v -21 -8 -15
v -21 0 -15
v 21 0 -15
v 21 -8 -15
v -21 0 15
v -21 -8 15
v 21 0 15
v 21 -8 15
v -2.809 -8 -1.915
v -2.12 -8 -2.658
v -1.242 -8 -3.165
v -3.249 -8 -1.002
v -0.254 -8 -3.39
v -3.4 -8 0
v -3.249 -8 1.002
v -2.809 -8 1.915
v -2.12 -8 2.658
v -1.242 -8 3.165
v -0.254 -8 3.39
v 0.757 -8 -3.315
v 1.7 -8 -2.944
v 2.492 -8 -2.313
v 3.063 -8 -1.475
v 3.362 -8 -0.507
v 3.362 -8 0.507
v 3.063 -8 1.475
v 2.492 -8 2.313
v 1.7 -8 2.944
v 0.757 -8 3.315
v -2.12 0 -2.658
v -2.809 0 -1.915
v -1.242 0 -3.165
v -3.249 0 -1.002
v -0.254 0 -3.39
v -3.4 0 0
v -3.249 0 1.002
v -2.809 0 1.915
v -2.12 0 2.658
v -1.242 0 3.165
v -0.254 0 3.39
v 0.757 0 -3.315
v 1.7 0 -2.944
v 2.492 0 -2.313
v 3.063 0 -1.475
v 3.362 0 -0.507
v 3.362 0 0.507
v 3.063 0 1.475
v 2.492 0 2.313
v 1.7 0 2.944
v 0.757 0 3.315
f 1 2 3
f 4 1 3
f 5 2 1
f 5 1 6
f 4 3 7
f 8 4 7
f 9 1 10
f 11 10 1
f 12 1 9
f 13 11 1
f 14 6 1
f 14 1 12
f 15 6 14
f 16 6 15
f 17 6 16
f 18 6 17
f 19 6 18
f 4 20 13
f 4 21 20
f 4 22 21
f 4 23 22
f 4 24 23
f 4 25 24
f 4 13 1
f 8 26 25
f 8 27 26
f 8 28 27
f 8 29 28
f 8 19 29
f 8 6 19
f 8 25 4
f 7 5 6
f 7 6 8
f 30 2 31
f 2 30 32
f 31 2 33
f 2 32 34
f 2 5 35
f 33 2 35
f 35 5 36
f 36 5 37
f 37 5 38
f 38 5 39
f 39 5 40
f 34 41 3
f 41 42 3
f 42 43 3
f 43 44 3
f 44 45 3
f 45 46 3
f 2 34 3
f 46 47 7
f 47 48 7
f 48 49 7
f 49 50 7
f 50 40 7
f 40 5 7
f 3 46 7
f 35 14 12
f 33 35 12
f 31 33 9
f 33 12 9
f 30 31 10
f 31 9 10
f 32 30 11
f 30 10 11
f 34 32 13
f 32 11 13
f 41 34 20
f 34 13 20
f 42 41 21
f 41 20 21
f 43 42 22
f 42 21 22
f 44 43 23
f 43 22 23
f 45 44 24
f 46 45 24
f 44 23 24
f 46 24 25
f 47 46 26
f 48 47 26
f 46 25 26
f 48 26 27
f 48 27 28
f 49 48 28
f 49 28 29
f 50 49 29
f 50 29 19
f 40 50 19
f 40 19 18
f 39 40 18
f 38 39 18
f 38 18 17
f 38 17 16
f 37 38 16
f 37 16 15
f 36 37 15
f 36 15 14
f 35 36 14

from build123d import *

# Parameters (mm, degrees)
F0_W     = 42
F0_H     = 30
F1_DEPTH = 8
F2_D     = 6.8


with BuildPart() as f1:
    # F0 (on Front) → F1 (new body)
    with BuildSketch(Plane.XZ):
        Rectangle(F0_W, F0_H)
    extrude(amount=F1_DEPTH)

    # F2 (through all)
    with Locations(Plane(origin=(0, 0, 0), x_dir=(1, 0, 0), z_dir=(0, 1, 0))):
        with Locations((0, 0)):
            Hole(F2_D / 2)


solid = f1.part
